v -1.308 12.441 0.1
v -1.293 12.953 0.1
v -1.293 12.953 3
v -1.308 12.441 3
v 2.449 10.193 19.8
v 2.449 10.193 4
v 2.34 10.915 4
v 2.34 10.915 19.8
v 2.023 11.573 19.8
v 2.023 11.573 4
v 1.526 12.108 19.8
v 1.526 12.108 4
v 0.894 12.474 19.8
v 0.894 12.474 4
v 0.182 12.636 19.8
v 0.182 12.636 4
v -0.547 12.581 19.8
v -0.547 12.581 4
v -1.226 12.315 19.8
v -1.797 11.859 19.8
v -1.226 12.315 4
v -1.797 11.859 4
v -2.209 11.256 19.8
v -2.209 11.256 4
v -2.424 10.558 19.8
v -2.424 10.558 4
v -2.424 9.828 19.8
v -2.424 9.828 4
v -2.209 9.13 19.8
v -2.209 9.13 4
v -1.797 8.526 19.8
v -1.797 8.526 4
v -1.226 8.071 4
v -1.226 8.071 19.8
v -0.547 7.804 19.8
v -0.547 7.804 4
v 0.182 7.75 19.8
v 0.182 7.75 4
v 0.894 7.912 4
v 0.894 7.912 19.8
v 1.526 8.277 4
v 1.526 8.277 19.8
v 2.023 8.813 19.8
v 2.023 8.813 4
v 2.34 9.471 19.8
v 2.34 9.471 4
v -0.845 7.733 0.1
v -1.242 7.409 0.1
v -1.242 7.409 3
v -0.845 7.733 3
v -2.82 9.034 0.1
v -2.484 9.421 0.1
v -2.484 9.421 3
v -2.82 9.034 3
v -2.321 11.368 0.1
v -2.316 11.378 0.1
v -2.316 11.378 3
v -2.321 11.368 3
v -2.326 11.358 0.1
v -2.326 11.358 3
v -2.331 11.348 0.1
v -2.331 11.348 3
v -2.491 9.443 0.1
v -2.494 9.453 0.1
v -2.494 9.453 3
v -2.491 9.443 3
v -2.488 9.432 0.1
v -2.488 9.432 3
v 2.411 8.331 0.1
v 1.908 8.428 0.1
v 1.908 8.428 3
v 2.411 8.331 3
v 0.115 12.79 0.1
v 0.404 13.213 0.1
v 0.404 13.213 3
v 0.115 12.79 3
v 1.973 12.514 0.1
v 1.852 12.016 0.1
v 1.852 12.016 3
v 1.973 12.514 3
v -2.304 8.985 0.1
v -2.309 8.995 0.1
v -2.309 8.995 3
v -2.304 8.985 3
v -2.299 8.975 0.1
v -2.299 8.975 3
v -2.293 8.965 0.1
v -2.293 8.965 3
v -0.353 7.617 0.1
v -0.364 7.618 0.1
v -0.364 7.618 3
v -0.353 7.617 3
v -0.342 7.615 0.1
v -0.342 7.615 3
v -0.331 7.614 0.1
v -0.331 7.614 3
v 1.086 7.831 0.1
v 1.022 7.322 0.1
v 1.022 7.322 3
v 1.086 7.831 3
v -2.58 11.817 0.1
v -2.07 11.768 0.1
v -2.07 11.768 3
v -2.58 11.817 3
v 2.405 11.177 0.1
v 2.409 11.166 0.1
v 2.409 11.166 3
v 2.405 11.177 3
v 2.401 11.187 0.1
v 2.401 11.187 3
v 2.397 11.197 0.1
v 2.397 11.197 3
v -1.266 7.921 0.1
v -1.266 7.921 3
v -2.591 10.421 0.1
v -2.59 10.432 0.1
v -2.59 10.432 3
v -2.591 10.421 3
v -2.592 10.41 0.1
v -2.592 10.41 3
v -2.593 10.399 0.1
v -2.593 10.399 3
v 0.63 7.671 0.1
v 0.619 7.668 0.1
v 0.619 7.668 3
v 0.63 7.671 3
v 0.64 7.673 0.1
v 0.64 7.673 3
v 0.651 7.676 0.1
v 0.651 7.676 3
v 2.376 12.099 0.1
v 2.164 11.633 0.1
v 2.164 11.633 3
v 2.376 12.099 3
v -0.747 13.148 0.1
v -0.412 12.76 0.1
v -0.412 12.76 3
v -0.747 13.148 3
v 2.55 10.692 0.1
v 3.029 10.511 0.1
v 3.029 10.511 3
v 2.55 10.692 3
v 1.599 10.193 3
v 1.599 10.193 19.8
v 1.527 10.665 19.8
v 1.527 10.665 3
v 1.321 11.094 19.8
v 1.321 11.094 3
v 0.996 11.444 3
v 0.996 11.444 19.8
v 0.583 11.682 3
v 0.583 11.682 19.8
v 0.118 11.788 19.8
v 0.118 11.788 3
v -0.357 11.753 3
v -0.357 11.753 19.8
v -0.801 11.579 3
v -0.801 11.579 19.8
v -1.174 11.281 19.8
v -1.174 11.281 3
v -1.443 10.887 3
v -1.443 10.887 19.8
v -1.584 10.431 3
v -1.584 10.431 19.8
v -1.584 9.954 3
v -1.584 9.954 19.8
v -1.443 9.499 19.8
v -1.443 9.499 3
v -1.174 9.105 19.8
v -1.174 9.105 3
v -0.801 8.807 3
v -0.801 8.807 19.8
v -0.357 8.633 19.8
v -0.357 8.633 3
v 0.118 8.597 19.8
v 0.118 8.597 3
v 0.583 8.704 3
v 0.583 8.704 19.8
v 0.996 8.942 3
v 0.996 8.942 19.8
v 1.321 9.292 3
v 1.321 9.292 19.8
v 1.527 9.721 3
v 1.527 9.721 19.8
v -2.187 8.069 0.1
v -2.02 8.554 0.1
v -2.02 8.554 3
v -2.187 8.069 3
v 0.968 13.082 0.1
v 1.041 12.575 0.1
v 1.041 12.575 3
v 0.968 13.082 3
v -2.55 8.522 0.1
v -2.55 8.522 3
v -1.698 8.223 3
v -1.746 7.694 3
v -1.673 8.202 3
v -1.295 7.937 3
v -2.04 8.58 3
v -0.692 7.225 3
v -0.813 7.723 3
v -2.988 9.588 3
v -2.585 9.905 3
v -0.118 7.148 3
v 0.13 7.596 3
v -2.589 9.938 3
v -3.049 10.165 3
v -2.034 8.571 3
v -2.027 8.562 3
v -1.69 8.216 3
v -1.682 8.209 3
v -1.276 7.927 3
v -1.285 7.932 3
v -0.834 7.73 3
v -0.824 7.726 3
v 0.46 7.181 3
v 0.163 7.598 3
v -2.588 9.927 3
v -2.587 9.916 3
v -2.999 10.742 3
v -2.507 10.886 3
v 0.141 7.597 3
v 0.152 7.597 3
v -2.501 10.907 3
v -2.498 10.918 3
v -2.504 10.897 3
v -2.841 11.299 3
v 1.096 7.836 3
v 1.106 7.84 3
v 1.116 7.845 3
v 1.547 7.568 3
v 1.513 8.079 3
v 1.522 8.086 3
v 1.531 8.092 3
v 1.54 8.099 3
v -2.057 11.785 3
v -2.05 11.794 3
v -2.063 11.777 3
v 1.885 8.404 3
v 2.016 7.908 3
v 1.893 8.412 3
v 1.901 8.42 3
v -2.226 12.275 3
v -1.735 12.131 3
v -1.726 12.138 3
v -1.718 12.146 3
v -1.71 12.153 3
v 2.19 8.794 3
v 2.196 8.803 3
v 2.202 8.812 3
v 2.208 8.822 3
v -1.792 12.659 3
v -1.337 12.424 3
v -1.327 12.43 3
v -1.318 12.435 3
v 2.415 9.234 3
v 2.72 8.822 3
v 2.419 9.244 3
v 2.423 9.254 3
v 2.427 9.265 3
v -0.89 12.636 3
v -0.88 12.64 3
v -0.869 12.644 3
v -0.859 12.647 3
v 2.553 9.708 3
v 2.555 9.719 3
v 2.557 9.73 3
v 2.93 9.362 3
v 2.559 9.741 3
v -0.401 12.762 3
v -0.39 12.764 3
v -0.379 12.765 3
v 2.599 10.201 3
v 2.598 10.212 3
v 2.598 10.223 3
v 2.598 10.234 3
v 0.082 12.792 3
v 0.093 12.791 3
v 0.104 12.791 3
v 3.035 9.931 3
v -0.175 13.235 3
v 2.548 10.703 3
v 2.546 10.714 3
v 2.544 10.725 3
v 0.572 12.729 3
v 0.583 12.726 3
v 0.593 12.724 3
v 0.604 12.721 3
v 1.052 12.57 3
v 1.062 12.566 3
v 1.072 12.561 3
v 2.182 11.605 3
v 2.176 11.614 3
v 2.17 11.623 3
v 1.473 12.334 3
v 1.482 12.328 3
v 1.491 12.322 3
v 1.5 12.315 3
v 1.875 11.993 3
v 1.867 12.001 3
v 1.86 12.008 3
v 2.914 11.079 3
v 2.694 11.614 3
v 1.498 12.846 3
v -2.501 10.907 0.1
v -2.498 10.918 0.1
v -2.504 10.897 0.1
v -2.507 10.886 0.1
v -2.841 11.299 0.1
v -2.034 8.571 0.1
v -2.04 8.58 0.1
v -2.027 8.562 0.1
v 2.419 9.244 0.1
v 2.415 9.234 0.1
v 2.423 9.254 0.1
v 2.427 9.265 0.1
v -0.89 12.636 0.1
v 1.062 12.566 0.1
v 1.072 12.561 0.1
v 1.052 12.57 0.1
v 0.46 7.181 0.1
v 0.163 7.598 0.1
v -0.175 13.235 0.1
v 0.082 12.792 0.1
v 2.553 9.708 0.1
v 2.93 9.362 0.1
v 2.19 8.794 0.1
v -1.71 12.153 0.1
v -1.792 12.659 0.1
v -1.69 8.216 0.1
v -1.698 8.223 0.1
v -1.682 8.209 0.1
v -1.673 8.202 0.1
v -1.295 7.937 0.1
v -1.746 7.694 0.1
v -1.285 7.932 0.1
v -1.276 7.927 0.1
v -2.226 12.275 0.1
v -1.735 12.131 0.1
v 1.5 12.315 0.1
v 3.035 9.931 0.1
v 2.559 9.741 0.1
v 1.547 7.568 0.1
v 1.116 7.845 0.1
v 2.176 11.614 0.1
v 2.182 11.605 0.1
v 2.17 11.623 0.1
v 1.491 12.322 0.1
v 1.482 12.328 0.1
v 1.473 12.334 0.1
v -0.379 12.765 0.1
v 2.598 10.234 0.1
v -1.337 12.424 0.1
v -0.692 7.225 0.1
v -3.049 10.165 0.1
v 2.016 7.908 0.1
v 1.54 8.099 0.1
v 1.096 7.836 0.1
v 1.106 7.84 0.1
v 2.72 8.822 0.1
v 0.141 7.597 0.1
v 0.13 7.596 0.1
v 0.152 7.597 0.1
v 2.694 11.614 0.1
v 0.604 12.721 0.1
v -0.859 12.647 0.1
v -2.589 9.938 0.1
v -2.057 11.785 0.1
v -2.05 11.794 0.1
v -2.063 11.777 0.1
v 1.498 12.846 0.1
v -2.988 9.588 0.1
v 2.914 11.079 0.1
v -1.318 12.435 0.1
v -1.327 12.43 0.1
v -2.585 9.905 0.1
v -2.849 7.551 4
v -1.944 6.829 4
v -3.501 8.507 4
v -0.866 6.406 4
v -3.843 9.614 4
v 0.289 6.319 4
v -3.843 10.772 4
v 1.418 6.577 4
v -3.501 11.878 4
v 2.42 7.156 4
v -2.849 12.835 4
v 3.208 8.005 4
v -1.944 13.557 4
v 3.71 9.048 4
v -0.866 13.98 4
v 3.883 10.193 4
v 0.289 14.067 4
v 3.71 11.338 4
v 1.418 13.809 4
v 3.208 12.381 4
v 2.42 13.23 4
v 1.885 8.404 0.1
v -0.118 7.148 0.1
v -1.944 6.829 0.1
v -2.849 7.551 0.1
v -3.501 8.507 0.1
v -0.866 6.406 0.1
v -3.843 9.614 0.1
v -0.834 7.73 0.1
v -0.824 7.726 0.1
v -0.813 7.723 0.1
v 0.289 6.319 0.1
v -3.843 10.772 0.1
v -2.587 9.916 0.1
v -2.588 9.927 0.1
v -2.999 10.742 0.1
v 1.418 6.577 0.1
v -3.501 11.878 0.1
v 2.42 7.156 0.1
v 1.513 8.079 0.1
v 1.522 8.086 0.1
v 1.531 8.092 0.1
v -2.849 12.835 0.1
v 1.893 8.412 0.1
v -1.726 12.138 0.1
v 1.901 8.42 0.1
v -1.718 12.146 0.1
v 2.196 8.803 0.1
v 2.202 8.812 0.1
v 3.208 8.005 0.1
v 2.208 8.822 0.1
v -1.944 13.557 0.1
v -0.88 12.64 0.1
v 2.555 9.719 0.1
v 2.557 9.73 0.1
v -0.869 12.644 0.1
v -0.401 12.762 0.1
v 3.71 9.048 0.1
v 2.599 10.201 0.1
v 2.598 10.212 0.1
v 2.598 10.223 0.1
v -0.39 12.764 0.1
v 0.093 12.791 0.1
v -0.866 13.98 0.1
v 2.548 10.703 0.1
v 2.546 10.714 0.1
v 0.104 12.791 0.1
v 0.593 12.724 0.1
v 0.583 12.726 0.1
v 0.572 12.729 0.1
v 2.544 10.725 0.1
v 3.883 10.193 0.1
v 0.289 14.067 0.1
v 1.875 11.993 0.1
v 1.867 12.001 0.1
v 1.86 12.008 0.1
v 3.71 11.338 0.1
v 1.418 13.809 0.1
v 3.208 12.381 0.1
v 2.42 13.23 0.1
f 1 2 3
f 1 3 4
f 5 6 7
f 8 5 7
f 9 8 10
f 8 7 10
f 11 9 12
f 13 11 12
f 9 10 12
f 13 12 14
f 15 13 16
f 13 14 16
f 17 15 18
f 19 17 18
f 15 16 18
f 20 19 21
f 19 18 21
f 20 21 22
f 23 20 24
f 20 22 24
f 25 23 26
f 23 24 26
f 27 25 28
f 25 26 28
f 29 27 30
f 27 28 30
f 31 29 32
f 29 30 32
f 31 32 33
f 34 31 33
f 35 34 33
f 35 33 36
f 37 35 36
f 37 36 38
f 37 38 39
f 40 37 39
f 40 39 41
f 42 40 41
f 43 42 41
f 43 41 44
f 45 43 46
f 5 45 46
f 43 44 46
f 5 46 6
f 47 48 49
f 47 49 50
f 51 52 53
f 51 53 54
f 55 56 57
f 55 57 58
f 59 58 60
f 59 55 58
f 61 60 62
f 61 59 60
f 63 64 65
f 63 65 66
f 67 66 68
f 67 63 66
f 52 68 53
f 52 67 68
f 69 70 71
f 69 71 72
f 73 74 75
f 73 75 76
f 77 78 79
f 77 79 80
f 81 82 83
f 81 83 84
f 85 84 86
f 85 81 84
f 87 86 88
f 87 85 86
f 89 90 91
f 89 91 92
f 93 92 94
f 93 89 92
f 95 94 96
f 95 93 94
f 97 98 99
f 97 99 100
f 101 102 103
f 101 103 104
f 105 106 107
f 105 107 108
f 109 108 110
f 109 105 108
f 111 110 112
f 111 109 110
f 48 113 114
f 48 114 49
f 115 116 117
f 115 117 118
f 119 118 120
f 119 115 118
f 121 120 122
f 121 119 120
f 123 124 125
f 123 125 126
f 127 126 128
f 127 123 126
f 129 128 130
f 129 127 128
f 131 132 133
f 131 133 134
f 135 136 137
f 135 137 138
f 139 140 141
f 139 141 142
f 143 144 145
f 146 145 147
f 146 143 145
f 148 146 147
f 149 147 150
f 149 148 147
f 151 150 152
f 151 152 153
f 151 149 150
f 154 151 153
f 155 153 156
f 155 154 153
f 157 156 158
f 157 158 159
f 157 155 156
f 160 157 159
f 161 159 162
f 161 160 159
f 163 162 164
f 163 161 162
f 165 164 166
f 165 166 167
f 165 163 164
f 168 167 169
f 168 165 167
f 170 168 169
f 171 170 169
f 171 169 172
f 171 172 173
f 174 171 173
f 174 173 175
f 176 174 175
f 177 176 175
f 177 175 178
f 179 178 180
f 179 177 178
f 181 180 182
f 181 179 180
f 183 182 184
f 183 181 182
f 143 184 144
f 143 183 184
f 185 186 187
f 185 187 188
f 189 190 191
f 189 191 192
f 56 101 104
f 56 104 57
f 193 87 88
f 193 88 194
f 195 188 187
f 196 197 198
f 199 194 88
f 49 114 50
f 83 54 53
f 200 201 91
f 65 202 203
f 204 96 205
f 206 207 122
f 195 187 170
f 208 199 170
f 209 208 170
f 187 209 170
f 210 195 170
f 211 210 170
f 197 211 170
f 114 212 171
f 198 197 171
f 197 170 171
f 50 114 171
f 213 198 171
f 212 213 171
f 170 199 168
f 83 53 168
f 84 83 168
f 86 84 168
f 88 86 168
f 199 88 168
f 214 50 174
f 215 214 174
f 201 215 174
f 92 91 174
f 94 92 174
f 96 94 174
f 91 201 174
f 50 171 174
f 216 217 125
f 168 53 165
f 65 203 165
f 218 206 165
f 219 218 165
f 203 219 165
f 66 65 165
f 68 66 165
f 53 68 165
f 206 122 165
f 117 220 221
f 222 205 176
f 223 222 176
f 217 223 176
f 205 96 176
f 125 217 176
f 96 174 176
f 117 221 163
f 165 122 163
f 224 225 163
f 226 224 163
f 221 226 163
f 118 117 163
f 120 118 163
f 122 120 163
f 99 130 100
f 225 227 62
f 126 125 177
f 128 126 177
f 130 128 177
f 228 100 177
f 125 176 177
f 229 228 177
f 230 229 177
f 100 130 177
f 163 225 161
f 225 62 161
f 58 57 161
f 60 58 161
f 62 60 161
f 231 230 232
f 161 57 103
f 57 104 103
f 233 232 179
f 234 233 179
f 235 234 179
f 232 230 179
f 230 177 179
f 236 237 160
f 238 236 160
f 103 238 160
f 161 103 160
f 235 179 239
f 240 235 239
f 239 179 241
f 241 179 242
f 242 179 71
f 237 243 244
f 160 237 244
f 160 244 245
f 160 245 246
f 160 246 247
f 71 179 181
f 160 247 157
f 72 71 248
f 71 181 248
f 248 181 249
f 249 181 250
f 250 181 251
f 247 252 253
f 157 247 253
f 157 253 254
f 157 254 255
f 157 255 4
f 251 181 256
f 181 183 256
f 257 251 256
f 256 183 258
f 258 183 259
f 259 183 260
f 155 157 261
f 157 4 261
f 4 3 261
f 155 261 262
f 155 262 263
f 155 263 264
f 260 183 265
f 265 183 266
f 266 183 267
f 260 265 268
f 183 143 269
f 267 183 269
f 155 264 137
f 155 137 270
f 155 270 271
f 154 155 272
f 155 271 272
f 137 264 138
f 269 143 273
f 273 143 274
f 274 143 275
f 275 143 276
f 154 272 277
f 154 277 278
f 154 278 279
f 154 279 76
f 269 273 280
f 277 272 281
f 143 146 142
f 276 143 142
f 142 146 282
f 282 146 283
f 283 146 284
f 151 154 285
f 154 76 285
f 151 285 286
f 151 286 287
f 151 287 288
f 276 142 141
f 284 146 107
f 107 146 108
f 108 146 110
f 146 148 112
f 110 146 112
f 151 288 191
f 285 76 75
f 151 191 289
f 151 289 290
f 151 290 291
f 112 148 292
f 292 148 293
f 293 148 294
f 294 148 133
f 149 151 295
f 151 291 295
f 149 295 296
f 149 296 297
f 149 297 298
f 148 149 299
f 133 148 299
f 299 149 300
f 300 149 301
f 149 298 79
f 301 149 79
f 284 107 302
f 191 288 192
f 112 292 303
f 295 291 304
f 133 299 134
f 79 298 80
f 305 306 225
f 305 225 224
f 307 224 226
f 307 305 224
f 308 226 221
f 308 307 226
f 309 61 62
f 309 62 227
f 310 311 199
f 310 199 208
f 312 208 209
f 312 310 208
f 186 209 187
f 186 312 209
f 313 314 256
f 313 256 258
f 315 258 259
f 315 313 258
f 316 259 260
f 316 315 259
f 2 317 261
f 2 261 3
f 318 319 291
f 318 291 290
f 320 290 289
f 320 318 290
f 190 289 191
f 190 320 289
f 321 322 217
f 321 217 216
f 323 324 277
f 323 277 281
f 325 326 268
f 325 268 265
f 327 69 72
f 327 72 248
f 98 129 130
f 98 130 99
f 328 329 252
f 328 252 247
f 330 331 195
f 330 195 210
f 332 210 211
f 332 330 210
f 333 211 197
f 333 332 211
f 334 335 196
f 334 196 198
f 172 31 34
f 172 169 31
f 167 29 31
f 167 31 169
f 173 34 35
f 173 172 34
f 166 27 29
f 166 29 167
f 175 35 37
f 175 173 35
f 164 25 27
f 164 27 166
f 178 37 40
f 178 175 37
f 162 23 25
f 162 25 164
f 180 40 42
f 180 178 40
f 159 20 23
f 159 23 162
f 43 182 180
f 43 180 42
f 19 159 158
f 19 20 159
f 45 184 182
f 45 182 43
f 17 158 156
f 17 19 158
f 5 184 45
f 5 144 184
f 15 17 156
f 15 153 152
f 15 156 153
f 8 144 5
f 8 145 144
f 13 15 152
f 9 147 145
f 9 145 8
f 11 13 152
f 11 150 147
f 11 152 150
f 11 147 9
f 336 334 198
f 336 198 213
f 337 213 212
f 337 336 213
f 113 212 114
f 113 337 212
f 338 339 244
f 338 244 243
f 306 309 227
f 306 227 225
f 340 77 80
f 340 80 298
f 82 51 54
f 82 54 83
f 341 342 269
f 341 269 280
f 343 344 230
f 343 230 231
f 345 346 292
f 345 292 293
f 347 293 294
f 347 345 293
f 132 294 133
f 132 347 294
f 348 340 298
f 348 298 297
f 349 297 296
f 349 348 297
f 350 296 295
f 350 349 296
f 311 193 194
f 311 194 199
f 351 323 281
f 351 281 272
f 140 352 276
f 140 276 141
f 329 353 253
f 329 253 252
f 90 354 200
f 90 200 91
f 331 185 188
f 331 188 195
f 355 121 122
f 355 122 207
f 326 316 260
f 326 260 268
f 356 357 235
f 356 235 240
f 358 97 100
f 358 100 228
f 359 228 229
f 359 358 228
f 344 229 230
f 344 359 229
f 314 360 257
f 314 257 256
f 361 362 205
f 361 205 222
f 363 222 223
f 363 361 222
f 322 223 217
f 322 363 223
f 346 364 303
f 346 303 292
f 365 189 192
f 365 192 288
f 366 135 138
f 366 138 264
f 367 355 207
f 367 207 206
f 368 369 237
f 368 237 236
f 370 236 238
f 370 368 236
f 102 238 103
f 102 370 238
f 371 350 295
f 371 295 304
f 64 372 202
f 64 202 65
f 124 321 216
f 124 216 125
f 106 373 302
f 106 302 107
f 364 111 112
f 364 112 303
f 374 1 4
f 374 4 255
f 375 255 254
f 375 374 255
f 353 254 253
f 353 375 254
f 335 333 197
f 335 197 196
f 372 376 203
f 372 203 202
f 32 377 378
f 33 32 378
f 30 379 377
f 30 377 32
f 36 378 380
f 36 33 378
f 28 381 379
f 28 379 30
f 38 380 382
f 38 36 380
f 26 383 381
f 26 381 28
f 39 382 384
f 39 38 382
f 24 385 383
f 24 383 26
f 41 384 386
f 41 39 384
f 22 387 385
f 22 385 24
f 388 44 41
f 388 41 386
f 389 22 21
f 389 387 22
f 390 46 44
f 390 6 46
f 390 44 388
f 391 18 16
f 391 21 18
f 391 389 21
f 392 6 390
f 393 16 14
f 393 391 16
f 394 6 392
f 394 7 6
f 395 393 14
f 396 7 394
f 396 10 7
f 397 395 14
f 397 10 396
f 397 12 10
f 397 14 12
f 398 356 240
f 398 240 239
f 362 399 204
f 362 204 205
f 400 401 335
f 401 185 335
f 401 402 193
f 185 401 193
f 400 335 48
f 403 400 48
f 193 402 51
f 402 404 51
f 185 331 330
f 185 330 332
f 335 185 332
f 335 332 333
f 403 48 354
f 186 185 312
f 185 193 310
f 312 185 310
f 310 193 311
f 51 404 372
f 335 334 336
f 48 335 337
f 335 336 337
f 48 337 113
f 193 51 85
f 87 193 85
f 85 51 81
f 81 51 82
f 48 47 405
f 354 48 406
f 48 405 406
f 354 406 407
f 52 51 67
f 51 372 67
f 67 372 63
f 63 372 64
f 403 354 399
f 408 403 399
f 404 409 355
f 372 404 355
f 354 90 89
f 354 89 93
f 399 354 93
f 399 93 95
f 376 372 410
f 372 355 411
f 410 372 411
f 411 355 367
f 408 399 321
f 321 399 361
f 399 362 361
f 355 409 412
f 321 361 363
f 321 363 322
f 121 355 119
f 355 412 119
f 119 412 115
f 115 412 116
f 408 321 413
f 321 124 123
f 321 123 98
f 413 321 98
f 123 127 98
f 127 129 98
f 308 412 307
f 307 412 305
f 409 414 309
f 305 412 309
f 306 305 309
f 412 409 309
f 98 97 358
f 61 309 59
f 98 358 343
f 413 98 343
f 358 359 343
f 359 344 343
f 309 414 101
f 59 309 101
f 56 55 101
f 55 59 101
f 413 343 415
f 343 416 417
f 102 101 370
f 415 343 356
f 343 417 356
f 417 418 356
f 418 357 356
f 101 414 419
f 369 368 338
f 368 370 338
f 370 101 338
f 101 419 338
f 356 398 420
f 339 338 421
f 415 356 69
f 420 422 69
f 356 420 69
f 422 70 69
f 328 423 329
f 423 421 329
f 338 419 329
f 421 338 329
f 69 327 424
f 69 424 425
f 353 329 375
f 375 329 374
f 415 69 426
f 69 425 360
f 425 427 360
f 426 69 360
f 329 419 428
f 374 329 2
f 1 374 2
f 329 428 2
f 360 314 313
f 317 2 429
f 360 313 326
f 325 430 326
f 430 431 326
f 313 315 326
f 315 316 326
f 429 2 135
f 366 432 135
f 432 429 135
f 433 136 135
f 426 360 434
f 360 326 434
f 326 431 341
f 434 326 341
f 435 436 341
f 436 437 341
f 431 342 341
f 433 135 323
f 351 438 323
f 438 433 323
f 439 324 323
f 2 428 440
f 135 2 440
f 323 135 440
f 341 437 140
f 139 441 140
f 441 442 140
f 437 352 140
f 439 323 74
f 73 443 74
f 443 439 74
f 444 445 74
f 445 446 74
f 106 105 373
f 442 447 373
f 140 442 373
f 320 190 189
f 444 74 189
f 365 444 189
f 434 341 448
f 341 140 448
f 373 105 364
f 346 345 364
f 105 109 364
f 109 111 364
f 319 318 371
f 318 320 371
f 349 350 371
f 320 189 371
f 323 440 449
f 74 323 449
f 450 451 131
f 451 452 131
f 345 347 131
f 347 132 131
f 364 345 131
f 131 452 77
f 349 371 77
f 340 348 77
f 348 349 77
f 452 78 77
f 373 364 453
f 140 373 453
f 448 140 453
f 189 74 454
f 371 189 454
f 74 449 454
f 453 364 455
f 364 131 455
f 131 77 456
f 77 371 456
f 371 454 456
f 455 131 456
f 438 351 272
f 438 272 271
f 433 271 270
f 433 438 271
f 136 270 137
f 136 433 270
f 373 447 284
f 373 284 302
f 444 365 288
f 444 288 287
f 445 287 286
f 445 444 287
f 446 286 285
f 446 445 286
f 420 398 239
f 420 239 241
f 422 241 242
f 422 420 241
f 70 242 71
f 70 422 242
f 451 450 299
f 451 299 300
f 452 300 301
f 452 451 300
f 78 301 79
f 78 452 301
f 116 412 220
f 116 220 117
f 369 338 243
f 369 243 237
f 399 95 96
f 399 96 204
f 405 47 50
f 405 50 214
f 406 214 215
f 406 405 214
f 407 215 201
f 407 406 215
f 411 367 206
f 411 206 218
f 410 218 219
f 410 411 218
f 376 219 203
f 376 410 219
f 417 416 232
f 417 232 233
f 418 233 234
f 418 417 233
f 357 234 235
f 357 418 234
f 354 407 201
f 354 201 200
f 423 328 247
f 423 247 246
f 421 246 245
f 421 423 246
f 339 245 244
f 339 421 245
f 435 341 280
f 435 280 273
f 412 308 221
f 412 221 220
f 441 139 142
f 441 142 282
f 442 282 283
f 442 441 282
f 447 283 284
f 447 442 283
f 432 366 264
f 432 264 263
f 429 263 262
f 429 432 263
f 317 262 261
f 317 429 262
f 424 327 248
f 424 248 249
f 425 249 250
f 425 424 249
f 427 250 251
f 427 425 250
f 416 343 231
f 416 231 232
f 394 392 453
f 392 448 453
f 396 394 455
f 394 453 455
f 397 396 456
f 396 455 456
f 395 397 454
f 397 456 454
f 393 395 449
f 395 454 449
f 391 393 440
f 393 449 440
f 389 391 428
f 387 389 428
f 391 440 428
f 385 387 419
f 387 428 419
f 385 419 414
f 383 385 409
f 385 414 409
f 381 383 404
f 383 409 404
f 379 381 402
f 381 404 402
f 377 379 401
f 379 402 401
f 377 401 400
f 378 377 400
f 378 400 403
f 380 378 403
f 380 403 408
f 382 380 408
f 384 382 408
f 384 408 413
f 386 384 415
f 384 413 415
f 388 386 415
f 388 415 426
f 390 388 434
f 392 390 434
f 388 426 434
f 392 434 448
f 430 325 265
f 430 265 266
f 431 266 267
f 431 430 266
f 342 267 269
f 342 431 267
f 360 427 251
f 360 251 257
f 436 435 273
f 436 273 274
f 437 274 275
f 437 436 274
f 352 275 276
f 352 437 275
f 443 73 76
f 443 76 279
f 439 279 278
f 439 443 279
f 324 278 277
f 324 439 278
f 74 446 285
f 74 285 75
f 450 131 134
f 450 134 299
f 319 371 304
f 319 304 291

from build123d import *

# Parameters (mm, degrees)
BOSS_EXTRUDE1_START = 0.1
SKETCH1_R           = 3.884465816
BOSS_EXTRUDE1_DEPTH = 2.9
SKETCH2_R           = 3.884465816
SKETCH2_R_2         = 1.6
BOSS_EXTRUDE2_DEPTH = 1
SKETCH3_R           = 2.45
SKETCH3_R_2         = 1.6
BOSS_EXTRUDE3_DEPTH = 15.8


with BuildPart() as part:
    # Sketch1 → Boss-Extrude1 (new body)
    with BuildSketch(Plane.XY.offset(BOSS_EXTRUDE1_START)):
        with Locations((-0.001459351, 10.192904416)):
            Circle(SKETCH1_R)
        with BuildLine():
            Line((0.96845111, 13.081919272), (0.60411229, 12.721398629))
            ThreePointArc((0.60411229, 12.721398629), (0.587991908, 12.72520519), (0.571847603, 12.728908977))
            Line((0.571847603, 12.728908977), (0.404173908, 13.213267772))
            Line((0.404173908, 13.213267772), (0.114648145, 12.790310631))
            ThreePointArc((0.114648145, 12.790310631), (0.098098683, 12.790997601), (0.08154518, 12.791579126))
            Line((0.08154518, 12.791579126), (-0.174763937, 13.23545247))
            Line((-0.174763937, 13.23545247), (-0.379012427, 12.765345605))
            ThreePointArc((-0.379012427, 12.765345605), (-0.395392828, 12.762888154), (-0.411757242, 12.760326399))
            Line((-0.411757242, 12.760326399), (-0.747438103, 13.147671554))
            Line((-0.747438103, 13.147671554), (-0.859027247, 12.647405852))
            ThreePointArc((-0.859027247, 12.647405852), (-0.874646558, 12.641892799), (-0.89023043, 12.636280352))
            Line((-0.89023043, 12.636280352), (-1.293150653, 12.953097656))
            Line((-1.293150653, 12.953097656), (-1.308047329, 12.440754022))
            ThreePointArc((-1.308047329, 12.440754022), (-1.322341026, 12.432384623), (-1.336581115, 12.423924333))
            Line((-1.336581115, 12.423924333), (-1.792178114, 12.658763182))
            Line((-1.792178114, 12.658763182), (-1.709843917, 12.152859051))
            ThreePointArc((-1.709843917, 12.152859051), (-1.72229539, 12.141935797), (-1.734677021, 12.130933442))
            Line((-1.734677021, 12.130933442), (-2.226484333, 12.275306147))
            Line((-2.226484333, 12.275306147), (-2.049895036, 11.794126212))
            ThreePointArc((-2.049895036, 11.794126212), (-2.060054255, 11.781043899), (-2.070129925, 11.767897132))
            Line((-2.070129925, 11.767897132), (-2.580372352, 11.816585689))
            Line((-2.580372352, 11.816585689), (-2.315910352, 11.377521046))
            ThreePointArc((-2.315910352, 11.377521046), (-2.323410137, 11.362752503), (-2.330815684, 11.347936481))
            Line((-2.330815684, 11.347936481), (-2.841051735, 11.299181158))
            Line((-2.841051735, 11.299181158), (-2.498275379, 10.918100748))
            ThreePointArc((-2.498275379, 10.918100748), (-2.502844667, 10.902179748), (-2.507312436, 10.886229962))
            Line((-2.507312436, 10.886229962), (-2.999100852, 10.741792904))
            Line((-2.999100852, 10.741792904), (-2.590398969, 10.432469965))
            ThreePointArc((-2.590398969, 10.432469965), (-2.591872615, 10.415971935), (-2.593241129, 10.399464852))
            Line((-2.593241129, 10.399464852), (-3.048807394, 10.16456639))
            Line((-3.048807394, 10.16456639), (-2.588951536, 9.938180659))
            ThreePointArc((-2.588951536, 9.938180659), (-2.587276279, 9.921701881), (-2.585496075, 9.905234109))
            Line((-2.585496075, 9.905234109), (-2.988374839, 9.588364086))
            Line((-2.988374839, 9.588364086), (-2.493985393, 9.453097734))
            ThreePointArc((-2.493985393, 9.453097734), (-2.489221781, 9.437233793), (-2.484357202, 9.421400521))
            Line((-2.484357202, 9.421400521), (-2.819987375, 9.034011444))
            Line((-2.819987375, 9.034011444), (-2.308932865, 8.994753349))
            ThreePointArc((-2.308932865, 8.994753349), (-2.301253067, 8.98007761), (-2.293479931, 8.965451093))
            Line((-2.293479931, 8.965451093), (-2.549730965, 8.521544214))
            Line((-2.549730965, 8.521544214), (-2.040482233, 8.579713266))
            ThreePointArc((-2.040482233, 8.579713266), (-2.030163816, 8.566756147), (-2.019763064, 8.553865027))
            Line((-2.019763064, 8.553865027), (-2.187373379, 8.069484296))
            Line((-2.187373379, 8.069484296), (-1.698336, 8.222978114))
            ThreePointArc((-1.698336, 8.222978114), (-1.6857519, 8.21220792), (-1.673099443, 8.201518114))
            Line((-1.673099443, 8.201518114), (-1.746011165, 7.694170314))
            Line((-1.746011165, 7.694170314), (-1.294860225, 7.937441231))
            ThreePointArc((-1.294860225, 7.937441231), (-1.280465263, 7.929247225), (-1.266018393, 7.921145091))
            Line((-1.266018393, 7.921145091), (-1.241596303, 7.409167093))
            Line((-1.241596303, 7.409167093), (-0.844637572, 7.733422664))
            ThreePointArc((-0.844637572, 7.733422664), (-0.82895202, 7.728100999), (-0.813232885, 7.722879369))
            Line((-0.813232885, 7.722879369), (-0.69235966, 7.224775391))
            Line((-0.69235966, 7.224775391), (-0.363940261, 7.618296176))
            ThreePointArc((-0.363940261, 7.618296176), (-0.347531036, 7.616039191), (-0.331107766, 7.613886788))
            Line((-0.331107766, 7.613886788), (-0.11815208, 7.147659606))
            Line((-0.11815208, 7.147659606), (0.129858055, 7.596222737))
            ThreePointArc((0.129858055, 7.596222737), (0.14639788, 7.597112005), (0.162931705, 7.598106624))
            Line((0.162931705, 7.598106624), (0.460273079, 7.180606903))
            Line((0.460273079, 7.180606903), (0.618910217, 7.66800014))
            ThreePointArc((0.618910217, 7.66800014), (0.634982852, 7.67200352), (0.651029656, 7.676109212))
            Line((0.651029656, 7.676109212), (1.022010025, 7.32242648))
            Line((1.022010025, 7.32242648), (1.085540607, 7.831034163))
            ThreePointArc((1.085540607, 7.831034163), (1.100565143, 7.838006962), (1.115544953, 7.845075337))
            Line((1.115544953, 7.845075337), (1.546756122, 7.567992608))
            Line((1.546756122, 7.567992608), (1.512883986, 8.079432329))
            ThreePointArc((1.512883986, 8.079432329), (1.526317398, 8.089122534), (1.539688805, 8.098898121))
            Line((1.539688805, 8.098898121), (2.015545677, 7.908429889))
            Line((2.015545677, 7.908429889), (1.885495051, 8.404216884))
            ThreePointArc((1.885495051, 8.404216884), (1.896851821, 8.416274264), (1.908131547, 8.428403749))
            Line((1.908131547, 8.428403749), (2.411435415, 8.331434031))
            Line((2.411435415, 8.331434031), (2.189906668, 8.793649267))
            ThreePointArc((2.189906668, 8.793649267), (2.198776332, 8.807638037), (2.207556699, 8.821683028))
            Line((2.207556699, 8.821683028), (2.72011685, 8.821716563))
            Line((2.72011685, 8.821716563), (2.415116608, 9.233654376))
            ThreePointArc((2.415116608, 9.233654376), (2.421178593, 9.249068946), (2.427142255, 9.264521821))
            Line((2.427142255, 9.264521821), (2.93043343, 9.361557396))
            Line((2.93043343, 9.361557396), (2.552985195, 9.708329281))
            ThreePointArc((2.552985195, 9.708329281), (2.556020406, 9.724612528), (2.558951821, 9.74091478))
            Line((2.558951821, 9.74091478), (3.034783766, 9.931445277))
            Line((3.034783766, 9.931445277), (2.598529502, 10.200517994))
            ThreePointArc((2.598529502, 10.200517994), (2.598428238, 10.217081399), (2.598221457, 10.233643822))
            Line((2.598221457, 10.233643822), (3.029396365, 10.510782972))
            Line((3.029396365, 10.510782972), (2.550103437, 10.692431532))
            ThreePointArc((2.550103437, 10.692431532), (2.546869358, 10.70867645), (2.543531855, 10.724900436))
            Line((2.543531855, 10.724900436), (2.914465941, 11.078631708))
            Line((2.914465941, 11.078631708), (2.409457245, 11.166290859))
            ThreePointArc((2.409457245, 11.166290859), (2.403207239, 11.181630157), (2.396859639, 11.196929327))
            Line((2.396859639, 11.196929327), (2.69414638, 11.614467952))
            Line((2.69414638, 11.614467952), (2.181674246, 11.604969464))
            ThreePointArc((2.181674246, 11.604969464), (2.172634204, 11.618848739), (2.163505927, 11.632670142))
            Line((2.163505927, 11.632670142), (2.376400605, 12.098925186))
            Line((2.376400605, 12.098925186), (1.87498711, 11.992612359))
            ThreePointArc((1.87498711, 11.992612359), (1.863483764, 12.004529978), (1.851904729, 12.016374073))
            Line((1.851904729, 12.016374073), (1.972712775, 12.514493863))
            Line((1.972712775, 12.514493863), (1.50048031, 12.315209119))
            ThreePointArc((1.50048031, 12.315209119), (1.48692942, 12.324734349), (1.473318124, 12.334173059))
            Line((1.473318124, 12.334173059), (1.497673221, 12.846154249))
            Line((1.497673221, 12.846154249), (1.071689498, 12.561100258))
            ThreePointArc((1.071689498, 12.561100258), (1.056580829, 12.567888832), (1.041429218, 12.574581017))
            Line((1.041429218, 12.574581017), (0.96845111, 13.081919272))
        make_face(mode=Mode.SUBTRACT)
    extrude(amount=BOSS_EXTRUDE1_DEPTH)

    # Sketch2 → Boss-Extrude2 (add)
    with BuildSketch(Plane.XY.offset(3)):
        with Locations((-0.001459351, 10.192904416)):
            Circle(SKETCH2_R)
        with Locations((-0.001459351, 10.192904416)):
            Circle(SKETCH2_R_2, mode=Mode.SUBTRACT)
    extrude(amount=BOSS_EXTRUDE2_DEPTH)

    # Sketch3 → Boss-Extrude3 (add)
    with BuildSketch(Plane.XY.offset(4)):
        with Locations((-0.001459351, 10.192904416)):
            Circle(SKETCH3_R)
        with Locations((-0.001459351, 10.192904416)):
            Circle(SKETCH3_R_2, mode=Mode.SUBTRACT)
    extrude(amount=BOSS_EXTRUDE3_DEPTH)


solid = part.part
